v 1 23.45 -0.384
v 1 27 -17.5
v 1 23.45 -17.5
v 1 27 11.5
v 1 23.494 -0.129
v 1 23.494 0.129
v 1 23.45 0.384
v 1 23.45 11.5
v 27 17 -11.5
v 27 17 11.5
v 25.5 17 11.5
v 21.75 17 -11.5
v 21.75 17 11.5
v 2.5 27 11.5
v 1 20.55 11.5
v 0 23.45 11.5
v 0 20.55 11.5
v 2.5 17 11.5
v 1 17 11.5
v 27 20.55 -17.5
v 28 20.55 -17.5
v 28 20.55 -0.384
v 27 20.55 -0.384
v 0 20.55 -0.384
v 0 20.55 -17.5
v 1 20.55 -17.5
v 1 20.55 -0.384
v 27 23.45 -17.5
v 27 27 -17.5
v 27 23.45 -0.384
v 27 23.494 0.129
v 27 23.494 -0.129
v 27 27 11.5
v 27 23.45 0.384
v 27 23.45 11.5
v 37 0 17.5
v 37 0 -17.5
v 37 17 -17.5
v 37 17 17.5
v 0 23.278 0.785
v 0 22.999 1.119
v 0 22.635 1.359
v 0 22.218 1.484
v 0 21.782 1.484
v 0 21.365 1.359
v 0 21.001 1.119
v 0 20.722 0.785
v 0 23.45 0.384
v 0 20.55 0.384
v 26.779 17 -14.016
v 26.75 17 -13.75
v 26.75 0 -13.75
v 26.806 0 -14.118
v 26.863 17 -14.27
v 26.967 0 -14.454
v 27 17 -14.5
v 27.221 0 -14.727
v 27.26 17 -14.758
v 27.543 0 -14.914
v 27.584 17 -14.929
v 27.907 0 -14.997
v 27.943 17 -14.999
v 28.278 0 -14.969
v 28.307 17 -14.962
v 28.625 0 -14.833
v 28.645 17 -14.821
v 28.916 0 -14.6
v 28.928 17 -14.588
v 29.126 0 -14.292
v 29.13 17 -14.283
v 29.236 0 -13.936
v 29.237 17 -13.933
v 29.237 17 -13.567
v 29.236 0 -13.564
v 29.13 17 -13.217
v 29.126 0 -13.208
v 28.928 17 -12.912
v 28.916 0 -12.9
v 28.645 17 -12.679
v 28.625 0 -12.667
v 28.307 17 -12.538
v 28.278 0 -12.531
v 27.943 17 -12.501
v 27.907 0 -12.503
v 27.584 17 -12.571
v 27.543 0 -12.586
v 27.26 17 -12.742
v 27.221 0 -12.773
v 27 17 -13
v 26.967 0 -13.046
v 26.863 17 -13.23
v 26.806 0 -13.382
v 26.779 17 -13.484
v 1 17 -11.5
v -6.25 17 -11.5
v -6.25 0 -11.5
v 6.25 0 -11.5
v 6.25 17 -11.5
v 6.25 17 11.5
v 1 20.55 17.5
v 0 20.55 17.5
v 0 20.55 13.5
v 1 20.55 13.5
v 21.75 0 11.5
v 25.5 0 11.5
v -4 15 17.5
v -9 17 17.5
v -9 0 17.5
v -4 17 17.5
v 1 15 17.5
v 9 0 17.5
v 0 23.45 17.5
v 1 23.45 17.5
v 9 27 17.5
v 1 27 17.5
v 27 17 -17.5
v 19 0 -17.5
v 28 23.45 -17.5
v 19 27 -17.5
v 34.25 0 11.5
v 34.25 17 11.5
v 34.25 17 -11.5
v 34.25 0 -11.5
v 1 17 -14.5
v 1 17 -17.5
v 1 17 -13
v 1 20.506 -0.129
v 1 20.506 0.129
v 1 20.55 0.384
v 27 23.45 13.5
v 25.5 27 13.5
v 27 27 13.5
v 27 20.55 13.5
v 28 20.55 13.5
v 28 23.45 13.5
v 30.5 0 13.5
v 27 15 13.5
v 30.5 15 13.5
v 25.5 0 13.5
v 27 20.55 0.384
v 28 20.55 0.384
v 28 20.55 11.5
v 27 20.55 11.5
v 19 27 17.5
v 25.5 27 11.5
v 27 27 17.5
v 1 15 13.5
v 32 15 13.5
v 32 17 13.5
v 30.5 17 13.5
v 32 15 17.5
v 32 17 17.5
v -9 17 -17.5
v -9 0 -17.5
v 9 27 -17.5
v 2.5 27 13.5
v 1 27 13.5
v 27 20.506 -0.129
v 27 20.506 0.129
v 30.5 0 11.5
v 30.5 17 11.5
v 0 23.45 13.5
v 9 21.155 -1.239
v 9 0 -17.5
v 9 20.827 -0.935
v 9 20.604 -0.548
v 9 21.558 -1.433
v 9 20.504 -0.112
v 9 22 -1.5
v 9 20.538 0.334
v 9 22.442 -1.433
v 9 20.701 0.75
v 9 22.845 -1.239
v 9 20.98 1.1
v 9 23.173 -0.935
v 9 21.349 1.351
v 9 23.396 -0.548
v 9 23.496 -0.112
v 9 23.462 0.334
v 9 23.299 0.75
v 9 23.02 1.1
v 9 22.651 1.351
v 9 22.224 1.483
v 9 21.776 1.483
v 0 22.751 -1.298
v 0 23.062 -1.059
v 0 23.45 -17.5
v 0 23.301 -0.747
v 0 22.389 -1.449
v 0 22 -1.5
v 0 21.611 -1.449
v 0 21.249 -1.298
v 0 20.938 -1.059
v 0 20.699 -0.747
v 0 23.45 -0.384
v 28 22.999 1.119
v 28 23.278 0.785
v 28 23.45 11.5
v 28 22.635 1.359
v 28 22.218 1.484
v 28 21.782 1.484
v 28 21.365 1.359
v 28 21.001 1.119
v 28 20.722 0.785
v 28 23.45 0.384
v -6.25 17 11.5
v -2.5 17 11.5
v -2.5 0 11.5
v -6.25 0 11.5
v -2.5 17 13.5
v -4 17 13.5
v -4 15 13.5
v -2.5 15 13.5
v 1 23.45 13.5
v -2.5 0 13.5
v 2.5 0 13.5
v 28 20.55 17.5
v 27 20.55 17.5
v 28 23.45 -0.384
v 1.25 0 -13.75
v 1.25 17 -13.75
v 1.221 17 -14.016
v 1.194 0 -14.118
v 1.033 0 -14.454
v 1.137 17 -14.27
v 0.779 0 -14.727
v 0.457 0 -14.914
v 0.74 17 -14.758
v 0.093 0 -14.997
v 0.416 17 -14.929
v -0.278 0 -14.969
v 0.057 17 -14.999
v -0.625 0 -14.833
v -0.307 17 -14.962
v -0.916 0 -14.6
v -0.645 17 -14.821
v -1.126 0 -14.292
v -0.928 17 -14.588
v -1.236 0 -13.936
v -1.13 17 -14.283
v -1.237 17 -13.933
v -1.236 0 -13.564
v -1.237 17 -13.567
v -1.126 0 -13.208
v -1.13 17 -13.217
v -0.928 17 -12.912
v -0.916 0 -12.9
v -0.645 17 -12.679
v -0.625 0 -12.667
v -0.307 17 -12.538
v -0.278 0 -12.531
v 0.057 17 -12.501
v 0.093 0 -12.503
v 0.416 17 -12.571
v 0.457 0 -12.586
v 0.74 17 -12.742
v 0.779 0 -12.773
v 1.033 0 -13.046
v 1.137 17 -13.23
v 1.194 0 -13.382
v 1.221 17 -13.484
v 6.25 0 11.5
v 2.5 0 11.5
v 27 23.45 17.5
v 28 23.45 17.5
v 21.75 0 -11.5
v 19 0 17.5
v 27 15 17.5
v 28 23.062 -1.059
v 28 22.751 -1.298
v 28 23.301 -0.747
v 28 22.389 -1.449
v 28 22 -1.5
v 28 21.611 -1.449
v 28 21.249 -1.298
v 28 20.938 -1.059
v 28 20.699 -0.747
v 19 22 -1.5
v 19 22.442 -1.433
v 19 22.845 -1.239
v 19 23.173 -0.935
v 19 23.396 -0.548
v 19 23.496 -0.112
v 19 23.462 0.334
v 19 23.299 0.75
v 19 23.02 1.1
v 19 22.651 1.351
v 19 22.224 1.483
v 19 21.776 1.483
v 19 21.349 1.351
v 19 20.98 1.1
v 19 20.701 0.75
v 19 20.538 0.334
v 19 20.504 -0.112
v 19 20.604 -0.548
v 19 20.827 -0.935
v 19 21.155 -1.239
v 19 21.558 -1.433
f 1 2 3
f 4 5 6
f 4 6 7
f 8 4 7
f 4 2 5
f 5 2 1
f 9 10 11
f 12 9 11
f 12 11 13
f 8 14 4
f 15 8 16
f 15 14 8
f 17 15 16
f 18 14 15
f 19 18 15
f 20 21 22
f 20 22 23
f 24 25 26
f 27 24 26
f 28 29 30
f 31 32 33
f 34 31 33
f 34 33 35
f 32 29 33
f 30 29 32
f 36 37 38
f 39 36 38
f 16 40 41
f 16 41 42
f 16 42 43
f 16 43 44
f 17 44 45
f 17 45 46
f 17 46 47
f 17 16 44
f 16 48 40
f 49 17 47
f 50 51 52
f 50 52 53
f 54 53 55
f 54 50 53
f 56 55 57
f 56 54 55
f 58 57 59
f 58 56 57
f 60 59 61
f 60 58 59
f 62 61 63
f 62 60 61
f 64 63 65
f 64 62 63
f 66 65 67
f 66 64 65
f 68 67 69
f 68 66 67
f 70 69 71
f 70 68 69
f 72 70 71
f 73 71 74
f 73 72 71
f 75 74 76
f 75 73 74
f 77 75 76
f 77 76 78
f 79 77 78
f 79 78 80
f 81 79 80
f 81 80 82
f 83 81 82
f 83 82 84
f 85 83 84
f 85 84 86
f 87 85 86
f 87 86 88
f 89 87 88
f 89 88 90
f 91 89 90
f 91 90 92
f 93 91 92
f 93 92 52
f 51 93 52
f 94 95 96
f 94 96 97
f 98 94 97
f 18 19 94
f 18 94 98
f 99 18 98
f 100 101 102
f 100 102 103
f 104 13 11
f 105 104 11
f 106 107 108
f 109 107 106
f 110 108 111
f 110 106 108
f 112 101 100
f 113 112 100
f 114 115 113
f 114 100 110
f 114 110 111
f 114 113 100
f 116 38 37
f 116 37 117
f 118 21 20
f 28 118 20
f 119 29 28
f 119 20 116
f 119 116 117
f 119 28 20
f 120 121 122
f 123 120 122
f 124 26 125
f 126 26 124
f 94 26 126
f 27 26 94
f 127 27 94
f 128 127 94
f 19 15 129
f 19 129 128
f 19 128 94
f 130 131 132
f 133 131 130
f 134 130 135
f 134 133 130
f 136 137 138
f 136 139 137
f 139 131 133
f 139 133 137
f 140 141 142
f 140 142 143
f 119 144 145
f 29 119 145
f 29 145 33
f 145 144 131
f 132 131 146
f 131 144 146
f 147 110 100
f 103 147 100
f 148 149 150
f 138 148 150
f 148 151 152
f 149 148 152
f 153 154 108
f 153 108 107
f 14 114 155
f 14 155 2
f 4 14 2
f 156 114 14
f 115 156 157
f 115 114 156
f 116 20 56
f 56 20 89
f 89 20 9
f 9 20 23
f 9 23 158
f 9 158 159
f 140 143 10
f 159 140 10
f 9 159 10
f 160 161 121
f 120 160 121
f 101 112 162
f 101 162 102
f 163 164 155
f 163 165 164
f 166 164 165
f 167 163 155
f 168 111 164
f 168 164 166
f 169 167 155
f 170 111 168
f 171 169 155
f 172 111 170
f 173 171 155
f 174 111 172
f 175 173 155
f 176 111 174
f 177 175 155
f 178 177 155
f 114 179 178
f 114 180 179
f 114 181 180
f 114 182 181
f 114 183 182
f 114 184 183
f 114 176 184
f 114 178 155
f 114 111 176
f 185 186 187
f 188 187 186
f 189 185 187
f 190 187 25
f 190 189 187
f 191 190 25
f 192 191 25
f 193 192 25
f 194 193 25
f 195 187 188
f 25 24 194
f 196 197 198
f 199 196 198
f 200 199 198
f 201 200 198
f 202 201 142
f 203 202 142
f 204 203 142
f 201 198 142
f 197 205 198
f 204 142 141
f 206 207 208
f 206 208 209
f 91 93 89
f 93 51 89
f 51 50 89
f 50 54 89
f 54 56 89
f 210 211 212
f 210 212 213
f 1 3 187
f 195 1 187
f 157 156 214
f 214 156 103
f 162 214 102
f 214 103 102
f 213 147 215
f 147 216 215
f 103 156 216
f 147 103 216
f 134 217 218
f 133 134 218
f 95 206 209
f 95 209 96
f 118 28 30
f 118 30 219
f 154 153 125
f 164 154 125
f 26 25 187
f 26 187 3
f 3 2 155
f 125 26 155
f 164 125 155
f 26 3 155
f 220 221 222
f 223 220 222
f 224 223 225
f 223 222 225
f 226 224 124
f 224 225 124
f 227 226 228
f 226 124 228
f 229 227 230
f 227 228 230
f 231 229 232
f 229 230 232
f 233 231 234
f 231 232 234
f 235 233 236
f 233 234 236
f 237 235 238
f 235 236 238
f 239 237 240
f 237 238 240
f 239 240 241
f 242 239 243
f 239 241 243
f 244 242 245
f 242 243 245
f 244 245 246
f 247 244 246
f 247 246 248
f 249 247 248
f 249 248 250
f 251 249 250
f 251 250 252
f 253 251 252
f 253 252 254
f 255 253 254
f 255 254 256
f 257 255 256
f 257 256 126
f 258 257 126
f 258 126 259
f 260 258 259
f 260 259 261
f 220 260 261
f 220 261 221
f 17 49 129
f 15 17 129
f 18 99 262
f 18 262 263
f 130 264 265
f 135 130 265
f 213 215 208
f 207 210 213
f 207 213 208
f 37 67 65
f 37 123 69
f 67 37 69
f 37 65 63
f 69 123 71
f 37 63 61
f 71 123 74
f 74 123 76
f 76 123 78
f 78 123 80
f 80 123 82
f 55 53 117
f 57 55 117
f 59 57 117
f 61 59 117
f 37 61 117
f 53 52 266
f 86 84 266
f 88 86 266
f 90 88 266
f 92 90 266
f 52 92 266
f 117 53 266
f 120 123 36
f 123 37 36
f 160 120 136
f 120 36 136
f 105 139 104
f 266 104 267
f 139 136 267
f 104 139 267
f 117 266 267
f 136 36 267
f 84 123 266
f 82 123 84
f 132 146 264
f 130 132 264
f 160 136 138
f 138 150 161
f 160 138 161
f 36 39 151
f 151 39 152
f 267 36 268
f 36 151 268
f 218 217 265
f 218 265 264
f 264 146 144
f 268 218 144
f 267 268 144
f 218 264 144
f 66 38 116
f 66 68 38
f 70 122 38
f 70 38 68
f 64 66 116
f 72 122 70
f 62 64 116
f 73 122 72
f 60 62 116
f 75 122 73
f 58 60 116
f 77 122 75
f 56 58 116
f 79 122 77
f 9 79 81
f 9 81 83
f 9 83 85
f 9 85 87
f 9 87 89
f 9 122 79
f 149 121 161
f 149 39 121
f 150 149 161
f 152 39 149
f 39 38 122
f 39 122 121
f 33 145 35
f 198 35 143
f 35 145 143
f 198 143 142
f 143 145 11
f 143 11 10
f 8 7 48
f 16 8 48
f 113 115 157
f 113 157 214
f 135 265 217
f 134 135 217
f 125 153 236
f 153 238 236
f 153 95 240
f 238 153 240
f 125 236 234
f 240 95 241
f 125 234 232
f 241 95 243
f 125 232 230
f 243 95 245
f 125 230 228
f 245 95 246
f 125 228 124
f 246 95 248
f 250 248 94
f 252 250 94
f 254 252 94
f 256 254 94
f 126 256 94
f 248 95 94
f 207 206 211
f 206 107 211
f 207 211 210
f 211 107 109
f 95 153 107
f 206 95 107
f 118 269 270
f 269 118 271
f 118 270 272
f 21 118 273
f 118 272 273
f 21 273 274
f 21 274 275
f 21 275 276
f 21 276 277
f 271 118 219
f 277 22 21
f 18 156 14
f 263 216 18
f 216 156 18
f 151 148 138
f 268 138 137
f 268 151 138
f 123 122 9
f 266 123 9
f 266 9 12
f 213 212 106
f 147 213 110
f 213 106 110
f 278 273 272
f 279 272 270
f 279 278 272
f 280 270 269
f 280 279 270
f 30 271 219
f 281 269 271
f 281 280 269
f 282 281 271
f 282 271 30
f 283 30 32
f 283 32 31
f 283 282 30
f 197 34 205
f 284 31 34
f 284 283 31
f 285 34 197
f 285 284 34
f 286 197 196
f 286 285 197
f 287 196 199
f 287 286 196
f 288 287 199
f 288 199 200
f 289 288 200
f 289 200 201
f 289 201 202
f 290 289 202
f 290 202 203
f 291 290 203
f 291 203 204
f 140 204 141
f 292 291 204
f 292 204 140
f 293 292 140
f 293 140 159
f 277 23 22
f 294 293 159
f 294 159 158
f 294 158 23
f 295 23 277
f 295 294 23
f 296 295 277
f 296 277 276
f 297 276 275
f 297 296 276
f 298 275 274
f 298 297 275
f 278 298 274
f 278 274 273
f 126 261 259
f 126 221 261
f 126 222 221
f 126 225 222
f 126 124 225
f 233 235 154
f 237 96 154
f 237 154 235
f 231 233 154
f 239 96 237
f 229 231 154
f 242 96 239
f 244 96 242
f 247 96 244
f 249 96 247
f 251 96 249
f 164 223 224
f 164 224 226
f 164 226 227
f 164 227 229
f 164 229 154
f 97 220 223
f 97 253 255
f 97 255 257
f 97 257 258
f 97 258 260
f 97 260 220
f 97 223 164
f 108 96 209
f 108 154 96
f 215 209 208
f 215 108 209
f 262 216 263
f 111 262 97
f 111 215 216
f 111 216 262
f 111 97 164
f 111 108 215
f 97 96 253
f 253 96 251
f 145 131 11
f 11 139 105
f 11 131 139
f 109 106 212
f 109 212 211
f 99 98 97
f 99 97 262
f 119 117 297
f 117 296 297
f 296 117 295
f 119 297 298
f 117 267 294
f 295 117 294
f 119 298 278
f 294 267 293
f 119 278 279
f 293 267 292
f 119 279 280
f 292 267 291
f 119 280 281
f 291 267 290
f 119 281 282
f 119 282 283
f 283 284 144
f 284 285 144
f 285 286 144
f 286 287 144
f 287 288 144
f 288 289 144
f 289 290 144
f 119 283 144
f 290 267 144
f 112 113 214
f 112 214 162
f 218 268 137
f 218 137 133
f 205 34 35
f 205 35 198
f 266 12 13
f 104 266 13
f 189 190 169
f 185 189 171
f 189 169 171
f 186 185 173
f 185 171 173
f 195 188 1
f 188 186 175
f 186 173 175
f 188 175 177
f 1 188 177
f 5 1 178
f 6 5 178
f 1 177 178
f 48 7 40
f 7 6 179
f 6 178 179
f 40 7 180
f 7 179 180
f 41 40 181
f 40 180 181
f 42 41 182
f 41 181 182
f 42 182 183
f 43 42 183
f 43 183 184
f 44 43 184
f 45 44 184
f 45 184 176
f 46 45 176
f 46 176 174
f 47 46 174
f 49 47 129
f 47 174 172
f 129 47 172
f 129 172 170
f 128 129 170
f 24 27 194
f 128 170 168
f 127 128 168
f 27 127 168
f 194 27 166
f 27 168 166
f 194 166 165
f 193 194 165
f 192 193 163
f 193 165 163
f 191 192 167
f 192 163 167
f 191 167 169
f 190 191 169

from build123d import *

# Parameters (mm, degrees)
SKETCH1_W             = 18
SKETCH1_H             = 17
MAIN_DEPTH            = 17.5
SKETCH2_R             = 1.25
FIXINGHOLE_DEPTH      = 18
SERVOSQUAREHOLE_DEPTH = 18
BOSS_EXTRUDE1_DEPTH   = 35
SKETCH5_R             = 1.5
CUT_EXTRUDE1_DEPTH    = 19
SKETCH6_W             = 5
SKETCH6_H             = 2
CUT_EXTRUDE2_DEPTH    = 28
SKETCH7_W             = 5
SKETCH7_H             = 2
CUT_EXTRUDE3_DEPTH    = 4


with BuildPart() as part:
    # Sketch1 → Main (new body, symmetric)
    with BuildSketch(Plane.XY):
        with Locations((0, 8.5)):
            Rectangle(SKETCH1_W, SKETCH1_H)
    extrude(amount=MAIN_DEPTH, both=True)

    # Sketch2 → FixingHole (cut, through all)
    with BuildSketch(Plane(origin=(0, 17, 0), x_dir=(1, 0, 0), z_dir=(0, 1, 0))):
        with Locations((0, 13.75)):
            Circle(SKETCH2_R)
    extrude(amount=-FIXINGHOLE_DEPTH, mode=Mode.SUBTRACT)

    # Sketch3 → ServoSquareHole (cut, through all)
    with BuildSketch(Plane(origin=(0, 17, 0), x_dir=(1, 0, 0), z_dir=(0, 1, 0))):
        Polygon((-6.25, 11.5), (6.25, 11.5), (6.25, -11.5), (2.5, -11.5), (2.5, -13.5), (-2.5, -13.5), (-2.5, -11.5), (-6.25, -11.5), align=None)
    extrude(amount=-SERVOSQUAREHOLE_DEPTH, mode=Mode.SUBTRACT)

    # Sketch4 → Boss-Extrude1 (add)
    with BuildSketch(Plane.XY.offset(17.5)):
        Polygon((9, 17), (9, 27), (1, 27), (1, 23.45), (0, 23.45), (0, 20.55), (1, 20.55), (1, 17), align=None)
    extrude(amount=-BOSS_EXTRUDE1_DEPTH)

    # Sketch5 → Cut-Extrude1 (cut, through all)
    with BuildSketch(Plane(origin=(9, 0, 0), x_dir=(0, 0, -1), z_dir=(1, 0, 0))):
        with Locations((0, 22)):
            Circle(SKETCH5_R)
    extrude(amount=-CUT_EXTRUDE1_DEPTH, mode=Mode.SUBTRACT)

    # Sketch6 → Cut-Extrude2 (cut, through all)
    with BuildSketch(Plane(origin=(0, 0, 0), x_dir=(-1, 0, 0), z_dir=(0, -1, 0))):
        with Locations((0, -12.5)):
            Rectangle(SKETCH6_W, SKETCH6_H)
    extrude(amount=-CUT_EXTRUDE2_DEPTH, mode=Mode.SUBTRACT)

    # Sketch7 → Cut-Extrude3 (cut)
    with BuildSketch(Plane.XY.offset(17.5)):
        with Locations((-1.5, 16)):
            Rectangle(SKETCH7_W, SKETCH7_H)
    extrude(amount=-CUT_EXTRUDE3_DEPTH, mode=Mode.SUBTRACT)


with BuildPart() as body_2:
    # Mirror1: mirrored copy
    add(part.part.mirror(Plane(origin=(14, 0, 0), x_dir=(0, 0, 1), z_dir=(1, 0, 0))))


solid = Compound([part.part, body_2.part])
